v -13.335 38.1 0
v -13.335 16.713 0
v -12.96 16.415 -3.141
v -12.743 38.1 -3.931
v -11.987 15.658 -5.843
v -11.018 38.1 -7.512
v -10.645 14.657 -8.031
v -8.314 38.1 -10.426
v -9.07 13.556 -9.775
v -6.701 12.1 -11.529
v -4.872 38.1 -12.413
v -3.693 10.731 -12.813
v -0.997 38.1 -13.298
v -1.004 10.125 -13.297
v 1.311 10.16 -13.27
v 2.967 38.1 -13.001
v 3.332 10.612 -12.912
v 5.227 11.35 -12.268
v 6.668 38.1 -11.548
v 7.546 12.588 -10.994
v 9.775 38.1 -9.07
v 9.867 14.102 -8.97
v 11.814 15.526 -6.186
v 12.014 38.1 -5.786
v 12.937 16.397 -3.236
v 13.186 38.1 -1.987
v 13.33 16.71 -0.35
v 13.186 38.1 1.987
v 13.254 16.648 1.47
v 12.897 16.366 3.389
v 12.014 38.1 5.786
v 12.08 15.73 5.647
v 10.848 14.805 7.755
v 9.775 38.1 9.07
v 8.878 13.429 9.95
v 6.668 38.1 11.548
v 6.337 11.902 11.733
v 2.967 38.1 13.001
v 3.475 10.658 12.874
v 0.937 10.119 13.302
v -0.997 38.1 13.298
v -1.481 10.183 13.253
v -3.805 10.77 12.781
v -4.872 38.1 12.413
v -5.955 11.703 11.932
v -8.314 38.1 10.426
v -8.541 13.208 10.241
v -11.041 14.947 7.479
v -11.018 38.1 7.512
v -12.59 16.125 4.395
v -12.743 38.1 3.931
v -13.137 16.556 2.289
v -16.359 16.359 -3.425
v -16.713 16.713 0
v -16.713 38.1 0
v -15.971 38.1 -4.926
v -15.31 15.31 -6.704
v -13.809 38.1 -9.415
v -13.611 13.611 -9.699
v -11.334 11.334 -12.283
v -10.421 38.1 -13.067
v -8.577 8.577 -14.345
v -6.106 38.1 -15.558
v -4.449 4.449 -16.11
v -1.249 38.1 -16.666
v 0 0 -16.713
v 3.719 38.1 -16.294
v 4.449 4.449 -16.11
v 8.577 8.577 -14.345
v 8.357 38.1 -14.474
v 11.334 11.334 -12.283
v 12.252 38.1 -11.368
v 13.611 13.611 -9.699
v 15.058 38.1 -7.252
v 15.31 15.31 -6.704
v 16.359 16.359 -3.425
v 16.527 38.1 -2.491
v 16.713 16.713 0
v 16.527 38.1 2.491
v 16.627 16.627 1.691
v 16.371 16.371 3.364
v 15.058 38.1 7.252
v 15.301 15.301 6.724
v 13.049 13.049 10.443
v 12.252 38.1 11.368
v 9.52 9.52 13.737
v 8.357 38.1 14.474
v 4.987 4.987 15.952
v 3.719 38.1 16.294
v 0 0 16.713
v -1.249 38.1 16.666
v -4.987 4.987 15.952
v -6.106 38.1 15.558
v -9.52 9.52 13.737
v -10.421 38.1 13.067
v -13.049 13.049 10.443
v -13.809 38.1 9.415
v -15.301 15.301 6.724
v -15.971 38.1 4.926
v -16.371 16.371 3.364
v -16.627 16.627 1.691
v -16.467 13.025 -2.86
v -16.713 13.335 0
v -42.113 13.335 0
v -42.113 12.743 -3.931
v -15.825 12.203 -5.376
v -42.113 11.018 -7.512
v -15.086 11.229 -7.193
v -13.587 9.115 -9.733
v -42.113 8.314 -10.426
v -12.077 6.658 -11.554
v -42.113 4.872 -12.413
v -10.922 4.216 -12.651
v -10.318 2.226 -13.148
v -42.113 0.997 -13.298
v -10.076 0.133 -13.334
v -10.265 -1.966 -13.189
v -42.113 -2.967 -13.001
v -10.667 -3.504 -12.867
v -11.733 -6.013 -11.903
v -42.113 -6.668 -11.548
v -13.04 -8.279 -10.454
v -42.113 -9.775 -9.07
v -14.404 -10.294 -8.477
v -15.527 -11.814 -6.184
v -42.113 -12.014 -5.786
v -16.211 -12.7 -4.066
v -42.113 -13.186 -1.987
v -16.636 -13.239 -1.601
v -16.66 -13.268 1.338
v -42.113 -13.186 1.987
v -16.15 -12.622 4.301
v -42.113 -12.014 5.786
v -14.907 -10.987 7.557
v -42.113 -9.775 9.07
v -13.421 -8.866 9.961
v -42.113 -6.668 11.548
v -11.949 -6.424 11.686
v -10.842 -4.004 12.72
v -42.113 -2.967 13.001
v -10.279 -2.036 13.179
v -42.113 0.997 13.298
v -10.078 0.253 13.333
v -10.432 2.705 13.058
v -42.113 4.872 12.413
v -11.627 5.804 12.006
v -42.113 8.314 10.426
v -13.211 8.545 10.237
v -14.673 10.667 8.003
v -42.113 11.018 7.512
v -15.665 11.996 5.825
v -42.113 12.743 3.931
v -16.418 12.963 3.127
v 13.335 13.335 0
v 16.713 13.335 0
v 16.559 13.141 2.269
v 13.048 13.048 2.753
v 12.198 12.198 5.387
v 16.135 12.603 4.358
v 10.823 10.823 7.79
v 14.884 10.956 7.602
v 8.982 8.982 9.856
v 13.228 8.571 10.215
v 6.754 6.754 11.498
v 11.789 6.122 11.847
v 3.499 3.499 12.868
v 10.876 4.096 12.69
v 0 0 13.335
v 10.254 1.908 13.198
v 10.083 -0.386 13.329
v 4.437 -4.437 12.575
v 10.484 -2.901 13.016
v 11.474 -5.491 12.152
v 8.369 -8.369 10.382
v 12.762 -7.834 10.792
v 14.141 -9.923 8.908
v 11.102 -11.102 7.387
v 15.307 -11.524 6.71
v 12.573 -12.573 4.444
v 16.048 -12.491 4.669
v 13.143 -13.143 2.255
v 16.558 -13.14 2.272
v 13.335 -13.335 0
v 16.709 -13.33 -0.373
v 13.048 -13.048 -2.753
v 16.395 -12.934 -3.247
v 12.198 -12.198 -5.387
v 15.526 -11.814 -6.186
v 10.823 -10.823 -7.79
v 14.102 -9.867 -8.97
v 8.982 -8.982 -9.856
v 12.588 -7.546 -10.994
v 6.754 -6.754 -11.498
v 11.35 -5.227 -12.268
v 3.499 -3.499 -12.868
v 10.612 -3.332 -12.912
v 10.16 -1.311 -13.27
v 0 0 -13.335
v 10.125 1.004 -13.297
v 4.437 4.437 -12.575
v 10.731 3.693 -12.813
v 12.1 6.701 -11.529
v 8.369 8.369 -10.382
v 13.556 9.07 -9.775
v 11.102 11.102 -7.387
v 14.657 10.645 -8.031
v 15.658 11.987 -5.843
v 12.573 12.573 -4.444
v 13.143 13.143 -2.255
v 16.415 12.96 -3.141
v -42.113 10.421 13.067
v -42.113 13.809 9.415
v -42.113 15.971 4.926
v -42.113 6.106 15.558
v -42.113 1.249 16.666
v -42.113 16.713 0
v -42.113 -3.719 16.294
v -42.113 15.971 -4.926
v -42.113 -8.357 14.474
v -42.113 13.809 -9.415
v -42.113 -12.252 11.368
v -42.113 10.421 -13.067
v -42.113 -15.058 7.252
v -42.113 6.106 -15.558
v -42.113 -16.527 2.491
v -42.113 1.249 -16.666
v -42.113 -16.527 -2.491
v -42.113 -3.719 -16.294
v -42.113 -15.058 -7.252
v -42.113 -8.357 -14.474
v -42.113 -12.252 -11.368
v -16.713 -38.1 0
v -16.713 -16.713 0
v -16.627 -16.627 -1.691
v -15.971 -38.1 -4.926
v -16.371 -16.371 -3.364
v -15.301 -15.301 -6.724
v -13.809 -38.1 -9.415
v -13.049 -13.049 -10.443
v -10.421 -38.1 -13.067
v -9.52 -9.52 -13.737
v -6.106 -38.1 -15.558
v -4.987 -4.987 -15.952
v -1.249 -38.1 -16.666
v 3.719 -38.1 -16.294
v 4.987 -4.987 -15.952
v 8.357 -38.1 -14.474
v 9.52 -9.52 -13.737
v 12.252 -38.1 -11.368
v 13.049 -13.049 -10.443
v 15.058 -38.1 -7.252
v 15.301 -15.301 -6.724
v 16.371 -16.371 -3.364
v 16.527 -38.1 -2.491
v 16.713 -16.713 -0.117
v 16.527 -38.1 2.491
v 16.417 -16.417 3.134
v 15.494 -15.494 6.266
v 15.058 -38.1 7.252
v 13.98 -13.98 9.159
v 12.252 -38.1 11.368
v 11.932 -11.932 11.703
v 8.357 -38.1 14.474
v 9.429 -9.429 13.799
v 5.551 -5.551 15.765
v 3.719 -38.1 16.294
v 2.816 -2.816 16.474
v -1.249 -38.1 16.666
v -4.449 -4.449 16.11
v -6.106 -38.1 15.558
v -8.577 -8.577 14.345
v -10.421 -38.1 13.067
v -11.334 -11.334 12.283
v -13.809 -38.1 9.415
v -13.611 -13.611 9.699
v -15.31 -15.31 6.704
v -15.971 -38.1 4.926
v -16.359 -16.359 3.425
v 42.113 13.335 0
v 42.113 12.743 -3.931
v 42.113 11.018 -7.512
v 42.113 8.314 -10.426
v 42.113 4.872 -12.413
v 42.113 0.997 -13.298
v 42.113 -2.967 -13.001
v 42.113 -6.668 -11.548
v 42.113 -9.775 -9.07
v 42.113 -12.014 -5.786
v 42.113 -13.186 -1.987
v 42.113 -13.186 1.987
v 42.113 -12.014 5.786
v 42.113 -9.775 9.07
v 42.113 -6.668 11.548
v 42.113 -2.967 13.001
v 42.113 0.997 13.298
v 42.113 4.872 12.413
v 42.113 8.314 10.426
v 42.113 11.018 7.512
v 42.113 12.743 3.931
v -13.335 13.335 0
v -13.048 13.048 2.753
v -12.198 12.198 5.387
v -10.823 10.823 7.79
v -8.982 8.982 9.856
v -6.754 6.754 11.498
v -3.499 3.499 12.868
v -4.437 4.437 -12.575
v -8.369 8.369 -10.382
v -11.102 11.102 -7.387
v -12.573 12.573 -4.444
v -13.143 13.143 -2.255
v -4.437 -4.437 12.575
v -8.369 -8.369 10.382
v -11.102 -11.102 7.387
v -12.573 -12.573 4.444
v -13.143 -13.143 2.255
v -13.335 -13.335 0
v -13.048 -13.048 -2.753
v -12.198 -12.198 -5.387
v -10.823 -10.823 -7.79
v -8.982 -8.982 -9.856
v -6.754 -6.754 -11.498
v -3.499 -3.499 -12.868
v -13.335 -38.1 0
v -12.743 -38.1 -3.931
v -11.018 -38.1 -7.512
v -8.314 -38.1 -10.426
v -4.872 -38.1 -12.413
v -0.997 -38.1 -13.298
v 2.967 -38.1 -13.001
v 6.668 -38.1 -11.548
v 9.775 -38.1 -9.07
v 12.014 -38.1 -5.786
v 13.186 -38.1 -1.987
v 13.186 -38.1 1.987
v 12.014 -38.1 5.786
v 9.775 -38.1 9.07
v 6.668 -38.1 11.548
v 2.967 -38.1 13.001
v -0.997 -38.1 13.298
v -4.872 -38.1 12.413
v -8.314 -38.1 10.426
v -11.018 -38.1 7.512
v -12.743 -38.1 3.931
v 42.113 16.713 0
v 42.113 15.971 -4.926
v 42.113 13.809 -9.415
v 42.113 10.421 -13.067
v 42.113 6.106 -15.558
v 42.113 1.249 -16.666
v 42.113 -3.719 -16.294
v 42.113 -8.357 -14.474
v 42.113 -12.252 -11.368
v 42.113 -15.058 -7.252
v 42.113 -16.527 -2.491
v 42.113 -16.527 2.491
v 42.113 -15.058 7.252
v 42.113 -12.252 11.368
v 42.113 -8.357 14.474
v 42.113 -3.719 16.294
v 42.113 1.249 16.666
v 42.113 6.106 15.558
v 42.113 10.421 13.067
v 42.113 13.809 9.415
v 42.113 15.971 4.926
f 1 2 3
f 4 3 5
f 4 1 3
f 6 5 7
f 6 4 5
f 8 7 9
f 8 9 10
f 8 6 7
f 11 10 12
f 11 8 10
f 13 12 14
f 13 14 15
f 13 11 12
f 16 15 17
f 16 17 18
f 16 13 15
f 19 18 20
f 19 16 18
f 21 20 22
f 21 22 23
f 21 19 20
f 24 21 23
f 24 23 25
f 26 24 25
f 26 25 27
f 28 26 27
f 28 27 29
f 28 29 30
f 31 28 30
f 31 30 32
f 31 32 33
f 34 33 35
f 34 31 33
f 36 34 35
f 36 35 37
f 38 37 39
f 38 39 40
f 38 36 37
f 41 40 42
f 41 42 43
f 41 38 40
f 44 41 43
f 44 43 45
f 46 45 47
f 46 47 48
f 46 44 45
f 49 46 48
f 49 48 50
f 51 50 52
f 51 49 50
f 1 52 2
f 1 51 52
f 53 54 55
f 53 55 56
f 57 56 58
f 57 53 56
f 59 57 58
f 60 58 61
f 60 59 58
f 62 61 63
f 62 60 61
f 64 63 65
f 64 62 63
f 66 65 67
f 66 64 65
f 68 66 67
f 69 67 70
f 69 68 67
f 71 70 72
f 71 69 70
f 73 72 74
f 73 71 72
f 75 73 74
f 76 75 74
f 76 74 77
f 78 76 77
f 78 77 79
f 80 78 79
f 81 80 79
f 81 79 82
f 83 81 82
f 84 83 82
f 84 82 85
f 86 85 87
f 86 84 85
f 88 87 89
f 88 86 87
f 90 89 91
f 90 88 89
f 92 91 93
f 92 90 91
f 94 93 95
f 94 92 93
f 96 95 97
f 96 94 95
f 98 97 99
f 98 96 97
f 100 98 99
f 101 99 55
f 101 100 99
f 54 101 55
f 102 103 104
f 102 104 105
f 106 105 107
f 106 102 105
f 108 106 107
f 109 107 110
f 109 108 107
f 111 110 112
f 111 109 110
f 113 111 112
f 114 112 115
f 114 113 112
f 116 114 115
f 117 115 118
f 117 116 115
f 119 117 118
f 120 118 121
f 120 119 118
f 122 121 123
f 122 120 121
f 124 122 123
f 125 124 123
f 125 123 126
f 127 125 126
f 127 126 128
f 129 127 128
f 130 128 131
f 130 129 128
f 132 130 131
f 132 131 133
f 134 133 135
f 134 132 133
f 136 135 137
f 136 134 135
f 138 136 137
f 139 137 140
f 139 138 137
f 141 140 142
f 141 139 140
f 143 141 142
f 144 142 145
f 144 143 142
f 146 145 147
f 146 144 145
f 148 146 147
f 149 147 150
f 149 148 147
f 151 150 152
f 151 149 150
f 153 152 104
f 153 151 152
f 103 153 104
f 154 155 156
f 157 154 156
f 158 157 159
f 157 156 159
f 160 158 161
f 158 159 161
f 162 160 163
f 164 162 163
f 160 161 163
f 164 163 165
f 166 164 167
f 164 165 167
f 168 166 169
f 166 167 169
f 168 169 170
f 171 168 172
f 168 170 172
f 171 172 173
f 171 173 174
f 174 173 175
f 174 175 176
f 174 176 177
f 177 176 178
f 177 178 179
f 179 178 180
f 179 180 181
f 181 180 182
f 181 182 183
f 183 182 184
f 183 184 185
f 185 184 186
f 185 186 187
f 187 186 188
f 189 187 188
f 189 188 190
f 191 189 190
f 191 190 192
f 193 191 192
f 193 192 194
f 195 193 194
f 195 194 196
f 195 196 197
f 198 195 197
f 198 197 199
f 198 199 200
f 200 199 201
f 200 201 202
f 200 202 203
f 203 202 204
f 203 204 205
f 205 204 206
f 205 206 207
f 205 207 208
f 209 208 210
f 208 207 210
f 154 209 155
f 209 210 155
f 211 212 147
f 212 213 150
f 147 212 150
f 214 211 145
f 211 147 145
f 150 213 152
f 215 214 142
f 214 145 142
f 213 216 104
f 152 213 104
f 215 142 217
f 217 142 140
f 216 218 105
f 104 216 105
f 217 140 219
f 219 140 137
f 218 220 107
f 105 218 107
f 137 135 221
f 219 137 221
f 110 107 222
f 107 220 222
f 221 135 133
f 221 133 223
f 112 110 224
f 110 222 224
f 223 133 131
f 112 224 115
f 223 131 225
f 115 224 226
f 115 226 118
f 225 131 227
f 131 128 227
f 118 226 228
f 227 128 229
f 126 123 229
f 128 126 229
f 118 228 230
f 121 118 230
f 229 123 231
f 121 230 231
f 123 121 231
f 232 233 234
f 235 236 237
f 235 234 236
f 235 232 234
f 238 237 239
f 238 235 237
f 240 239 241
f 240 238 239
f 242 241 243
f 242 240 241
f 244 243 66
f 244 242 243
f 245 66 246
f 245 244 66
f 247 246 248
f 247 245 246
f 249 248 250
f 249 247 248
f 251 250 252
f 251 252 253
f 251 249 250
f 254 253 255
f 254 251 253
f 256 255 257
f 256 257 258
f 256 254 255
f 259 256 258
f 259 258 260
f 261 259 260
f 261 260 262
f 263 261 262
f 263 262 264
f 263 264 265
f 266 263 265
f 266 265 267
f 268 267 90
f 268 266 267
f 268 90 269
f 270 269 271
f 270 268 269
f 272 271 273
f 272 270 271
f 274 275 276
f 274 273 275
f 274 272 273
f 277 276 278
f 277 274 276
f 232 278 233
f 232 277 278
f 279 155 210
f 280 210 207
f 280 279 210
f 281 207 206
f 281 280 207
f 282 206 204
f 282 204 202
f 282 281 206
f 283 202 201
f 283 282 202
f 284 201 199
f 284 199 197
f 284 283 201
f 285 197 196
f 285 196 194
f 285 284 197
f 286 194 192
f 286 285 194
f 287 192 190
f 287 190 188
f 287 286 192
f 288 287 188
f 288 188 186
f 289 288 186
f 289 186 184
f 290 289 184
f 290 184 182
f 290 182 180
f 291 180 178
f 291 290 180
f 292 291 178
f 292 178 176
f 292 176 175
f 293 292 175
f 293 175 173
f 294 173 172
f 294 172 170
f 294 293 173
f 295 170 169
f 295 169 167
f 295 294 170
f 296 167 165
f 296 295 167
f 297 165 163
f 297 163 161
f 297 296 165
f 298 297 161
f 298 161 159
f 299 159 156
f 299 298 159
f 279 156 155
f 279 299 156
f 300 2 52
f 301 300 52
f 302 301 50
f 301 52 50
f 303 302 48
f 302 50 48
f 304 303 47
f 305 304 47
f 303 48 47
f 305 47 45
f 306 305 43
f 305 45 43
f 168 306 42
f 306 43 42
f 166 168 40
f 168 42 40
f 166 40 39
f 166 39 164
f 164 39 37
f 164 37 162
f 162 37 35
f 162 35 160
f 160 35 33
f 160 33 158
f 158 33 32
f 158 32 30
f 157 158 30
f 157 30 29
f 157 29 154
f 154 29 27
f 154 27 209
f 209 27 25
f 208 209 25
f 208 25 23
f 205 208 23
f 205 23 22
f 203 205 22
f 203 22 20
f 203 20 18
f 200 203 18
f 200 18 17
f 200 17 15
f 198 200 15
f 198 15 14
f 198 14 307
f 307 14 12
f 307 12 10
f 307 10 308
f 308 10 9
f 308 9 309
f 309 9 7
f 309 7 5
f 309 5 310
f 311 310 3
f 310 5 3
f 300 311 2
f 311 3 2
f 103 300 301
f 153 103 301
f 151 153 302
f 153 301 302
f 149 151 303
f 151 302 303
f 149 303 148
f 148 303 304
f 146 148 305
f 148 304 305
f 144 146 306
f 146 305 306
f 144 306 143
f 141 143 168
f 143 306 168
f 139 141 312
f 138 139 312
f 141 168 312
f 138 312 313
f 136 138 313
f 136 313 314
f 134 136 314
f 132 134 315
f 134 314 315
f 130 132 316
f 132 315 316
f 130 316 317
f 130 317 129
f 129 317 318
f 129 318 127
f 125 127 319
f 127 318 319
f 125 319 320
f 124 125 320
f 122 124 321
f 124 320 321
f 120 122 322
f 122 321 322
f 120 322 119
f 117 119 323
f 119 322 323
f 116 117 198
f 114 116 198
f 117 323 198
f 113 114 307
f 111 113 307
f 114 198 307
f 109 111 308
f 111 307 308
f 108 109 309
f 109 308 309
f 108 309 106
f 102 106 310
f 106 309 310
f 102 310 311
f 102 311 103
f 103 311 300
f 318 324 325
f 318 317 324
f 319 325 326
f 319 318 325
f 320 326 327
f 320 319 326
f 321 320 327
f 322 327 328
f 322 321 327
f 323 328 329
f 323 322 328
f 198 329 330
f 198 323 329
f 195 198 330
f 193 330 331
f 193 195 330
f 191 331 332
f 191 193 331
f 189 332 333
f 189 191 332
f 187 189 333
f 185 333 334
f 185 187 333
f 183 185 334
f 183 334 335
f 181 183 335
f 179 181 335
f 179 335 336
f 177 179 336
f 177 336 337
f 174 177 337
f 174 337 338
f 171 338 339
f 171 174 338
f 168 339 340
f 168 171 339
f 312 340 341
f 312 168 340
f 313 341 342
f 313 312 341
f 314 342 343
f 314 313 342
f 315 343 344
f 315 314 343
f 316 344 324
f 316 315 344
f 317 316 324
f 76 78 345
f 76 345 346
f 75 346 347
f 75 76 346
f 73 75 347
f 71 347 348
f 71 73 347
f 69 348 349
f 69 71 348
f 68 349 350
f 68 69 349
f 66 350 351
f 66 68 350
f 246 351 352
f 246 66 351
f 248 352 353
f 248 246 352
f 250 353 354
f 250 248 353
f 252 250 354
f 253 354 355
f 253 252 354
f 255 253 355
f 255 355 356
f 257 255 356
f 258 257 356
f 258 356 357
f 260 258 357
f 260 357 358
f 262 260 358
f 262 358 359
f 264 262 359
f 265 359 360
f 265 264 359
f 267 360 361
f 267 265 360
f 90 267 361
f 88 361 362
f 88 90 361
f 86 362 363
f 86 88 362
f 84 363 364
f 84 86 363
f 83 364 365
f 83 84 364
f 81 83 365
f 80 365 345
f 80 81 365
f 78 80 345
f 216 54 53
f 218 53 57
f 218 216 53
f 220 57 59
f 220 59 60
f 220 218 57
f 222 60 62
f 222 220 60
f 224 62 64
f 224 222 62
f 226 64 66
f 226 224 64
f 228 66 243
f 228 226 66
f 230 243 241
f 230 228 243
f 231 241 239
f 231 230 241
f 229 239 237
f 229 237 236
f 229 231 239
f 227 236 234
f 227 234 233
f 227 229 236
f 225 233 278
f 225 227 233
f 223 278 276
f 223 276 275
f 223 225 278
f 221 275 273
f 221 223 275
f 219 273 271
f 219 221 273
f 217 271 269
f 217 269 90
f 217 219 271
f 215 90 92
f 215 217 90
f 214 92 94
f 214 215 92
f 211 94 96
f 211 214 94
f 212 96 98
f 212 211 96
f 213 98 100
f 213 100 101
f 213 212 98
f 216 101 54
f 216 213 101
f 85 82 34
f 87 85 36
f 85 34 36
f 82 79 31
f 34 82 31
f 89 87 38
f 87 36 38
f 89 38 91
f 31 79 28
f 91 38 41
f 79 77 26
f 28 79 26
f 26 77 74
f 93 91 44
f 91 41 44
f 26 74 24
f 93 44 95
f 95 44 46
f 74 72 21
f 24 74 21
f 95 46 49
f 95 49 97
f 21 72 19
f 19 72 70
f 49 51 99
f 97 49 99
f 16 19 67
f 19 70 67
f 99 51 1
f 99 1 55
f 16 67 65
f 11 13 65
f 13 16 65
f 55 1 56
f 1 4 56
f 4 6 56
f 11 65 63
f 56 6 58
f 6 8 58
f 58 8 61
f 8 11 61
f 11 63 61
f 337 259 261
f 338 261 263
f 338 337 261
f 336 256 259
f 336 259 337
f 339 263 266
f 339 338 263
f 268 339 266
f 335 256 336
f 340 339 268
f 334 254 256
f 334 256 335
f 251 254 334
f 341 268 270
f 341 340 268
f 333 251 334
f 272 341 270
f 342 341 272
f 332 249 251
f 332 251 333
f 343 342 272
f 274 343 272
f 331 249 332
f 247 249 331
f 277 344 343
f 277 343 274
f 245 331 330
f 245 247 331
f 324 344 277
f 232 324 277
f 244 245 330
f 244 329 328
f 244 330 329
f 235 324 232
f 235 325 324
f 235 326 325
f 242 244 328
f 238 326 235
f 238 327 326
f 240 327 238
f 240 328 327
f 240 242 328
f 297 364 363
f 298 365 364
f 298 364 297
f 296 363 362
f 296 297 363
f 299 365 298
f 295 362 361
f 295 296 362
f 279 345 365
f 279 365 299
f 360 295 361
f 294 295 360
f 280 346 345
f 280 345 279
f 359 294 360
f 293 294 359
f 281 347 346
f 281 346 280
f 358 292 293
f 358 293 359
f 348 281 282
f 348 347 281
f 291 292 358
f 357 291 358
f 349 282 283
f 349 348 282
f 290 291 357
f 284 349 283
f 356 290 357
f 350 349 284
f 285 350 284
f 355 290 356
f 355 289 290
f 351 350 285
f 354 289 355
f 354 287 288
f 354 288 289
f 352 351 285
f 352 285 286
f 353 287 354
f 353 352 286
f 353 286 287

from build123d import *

# Parameters (mm, degrees)
F0_W     = 25.4
F0_H     = 3.3782
F0_W_2   = 3.3782
F0_W_3   = 13.335
F0_H_2   = 21.3868
F0_H_3   = 13.335
F3_R     = 13.335
F4_DEPTH = 84.2274001
F5_R     = 13.335
F6_DEPTH = 76.2010001


with BuildPart() as f1:
    # F0 (on Top) → F1 (revolve)
    with BuildSketch(Plane.XY):
        with Locations((-29.4132, 15.0241)):
            Rectangle(F0_W, F0_H)
        with Locations((-15.0241, 15.0241)):
            Rectangle(F0_W_2, F0_H)
        with Locations((-6.6675, 15.0241)):
            Rectangle(F0_W_3, F0_H)
        Polygon((13.335, 16.7132), (0, 16.7132), (0, 13.335), (3.2870748948, 13.335), (13.335, 13.335), align=None)
        with Locations((15.0241, 15.0241)):
            Rectangle(F0_W_2, F0_H)
        with Locations((29.4132, 15.0241)):
            Rectangle(F0_W, F0_H)
    revolve(axis=Axis((-21.0566, 0, 0), (-1, 0, 0)))

    # F0 (on Top) → F2 (revolve)
    with BuildSketch(Plane.XY):
        with Locations((-15.0241, -27.4066)):
            Rectangle(F0_W_2, F0_H_2)
        with Locations((-15.0241, -15.0241)):
            Rectangle(F0_W_2, F0_H)
        with Locations((-15.0241, -6.6675)):
            Rectangle(F0_W_2, F0_H_3)
        with Locations((-15.0241, 6.6675)):
            Rectangle(F0_W_2, F0_H_3)
        with Locations((-15.0241, 15.0241)):
            Rectangle(F0_W_2, F0_H)
        with Locations((-15.0241, 27.4066)):
            Rectangle(F0_W_2, F0_H_2)
    revolve(axis=Axis((0, 19.05, 0), (0, -1, 0)))

    # F3 (on face) → F4 (cut, through all)
    with BuildSketch(Plane.YZ.offset(42.1132)):
        Circle(F3_R)
    extrude(amount=-F4_DEPTH, mode=Mode.SUBTRACT)

    # F5 (on face) → F6 (cut, through all)
    with BuildSketch(Plane(origin=(0, 38.1, 0), x_dir=(-1, 0, 0), z_dir=(0, 1, 0))):
        Circle(F5_R)
    extrude(amount=-F6_DEPTH, mode=Mode.SUBTRACT)


solid = f1.part
